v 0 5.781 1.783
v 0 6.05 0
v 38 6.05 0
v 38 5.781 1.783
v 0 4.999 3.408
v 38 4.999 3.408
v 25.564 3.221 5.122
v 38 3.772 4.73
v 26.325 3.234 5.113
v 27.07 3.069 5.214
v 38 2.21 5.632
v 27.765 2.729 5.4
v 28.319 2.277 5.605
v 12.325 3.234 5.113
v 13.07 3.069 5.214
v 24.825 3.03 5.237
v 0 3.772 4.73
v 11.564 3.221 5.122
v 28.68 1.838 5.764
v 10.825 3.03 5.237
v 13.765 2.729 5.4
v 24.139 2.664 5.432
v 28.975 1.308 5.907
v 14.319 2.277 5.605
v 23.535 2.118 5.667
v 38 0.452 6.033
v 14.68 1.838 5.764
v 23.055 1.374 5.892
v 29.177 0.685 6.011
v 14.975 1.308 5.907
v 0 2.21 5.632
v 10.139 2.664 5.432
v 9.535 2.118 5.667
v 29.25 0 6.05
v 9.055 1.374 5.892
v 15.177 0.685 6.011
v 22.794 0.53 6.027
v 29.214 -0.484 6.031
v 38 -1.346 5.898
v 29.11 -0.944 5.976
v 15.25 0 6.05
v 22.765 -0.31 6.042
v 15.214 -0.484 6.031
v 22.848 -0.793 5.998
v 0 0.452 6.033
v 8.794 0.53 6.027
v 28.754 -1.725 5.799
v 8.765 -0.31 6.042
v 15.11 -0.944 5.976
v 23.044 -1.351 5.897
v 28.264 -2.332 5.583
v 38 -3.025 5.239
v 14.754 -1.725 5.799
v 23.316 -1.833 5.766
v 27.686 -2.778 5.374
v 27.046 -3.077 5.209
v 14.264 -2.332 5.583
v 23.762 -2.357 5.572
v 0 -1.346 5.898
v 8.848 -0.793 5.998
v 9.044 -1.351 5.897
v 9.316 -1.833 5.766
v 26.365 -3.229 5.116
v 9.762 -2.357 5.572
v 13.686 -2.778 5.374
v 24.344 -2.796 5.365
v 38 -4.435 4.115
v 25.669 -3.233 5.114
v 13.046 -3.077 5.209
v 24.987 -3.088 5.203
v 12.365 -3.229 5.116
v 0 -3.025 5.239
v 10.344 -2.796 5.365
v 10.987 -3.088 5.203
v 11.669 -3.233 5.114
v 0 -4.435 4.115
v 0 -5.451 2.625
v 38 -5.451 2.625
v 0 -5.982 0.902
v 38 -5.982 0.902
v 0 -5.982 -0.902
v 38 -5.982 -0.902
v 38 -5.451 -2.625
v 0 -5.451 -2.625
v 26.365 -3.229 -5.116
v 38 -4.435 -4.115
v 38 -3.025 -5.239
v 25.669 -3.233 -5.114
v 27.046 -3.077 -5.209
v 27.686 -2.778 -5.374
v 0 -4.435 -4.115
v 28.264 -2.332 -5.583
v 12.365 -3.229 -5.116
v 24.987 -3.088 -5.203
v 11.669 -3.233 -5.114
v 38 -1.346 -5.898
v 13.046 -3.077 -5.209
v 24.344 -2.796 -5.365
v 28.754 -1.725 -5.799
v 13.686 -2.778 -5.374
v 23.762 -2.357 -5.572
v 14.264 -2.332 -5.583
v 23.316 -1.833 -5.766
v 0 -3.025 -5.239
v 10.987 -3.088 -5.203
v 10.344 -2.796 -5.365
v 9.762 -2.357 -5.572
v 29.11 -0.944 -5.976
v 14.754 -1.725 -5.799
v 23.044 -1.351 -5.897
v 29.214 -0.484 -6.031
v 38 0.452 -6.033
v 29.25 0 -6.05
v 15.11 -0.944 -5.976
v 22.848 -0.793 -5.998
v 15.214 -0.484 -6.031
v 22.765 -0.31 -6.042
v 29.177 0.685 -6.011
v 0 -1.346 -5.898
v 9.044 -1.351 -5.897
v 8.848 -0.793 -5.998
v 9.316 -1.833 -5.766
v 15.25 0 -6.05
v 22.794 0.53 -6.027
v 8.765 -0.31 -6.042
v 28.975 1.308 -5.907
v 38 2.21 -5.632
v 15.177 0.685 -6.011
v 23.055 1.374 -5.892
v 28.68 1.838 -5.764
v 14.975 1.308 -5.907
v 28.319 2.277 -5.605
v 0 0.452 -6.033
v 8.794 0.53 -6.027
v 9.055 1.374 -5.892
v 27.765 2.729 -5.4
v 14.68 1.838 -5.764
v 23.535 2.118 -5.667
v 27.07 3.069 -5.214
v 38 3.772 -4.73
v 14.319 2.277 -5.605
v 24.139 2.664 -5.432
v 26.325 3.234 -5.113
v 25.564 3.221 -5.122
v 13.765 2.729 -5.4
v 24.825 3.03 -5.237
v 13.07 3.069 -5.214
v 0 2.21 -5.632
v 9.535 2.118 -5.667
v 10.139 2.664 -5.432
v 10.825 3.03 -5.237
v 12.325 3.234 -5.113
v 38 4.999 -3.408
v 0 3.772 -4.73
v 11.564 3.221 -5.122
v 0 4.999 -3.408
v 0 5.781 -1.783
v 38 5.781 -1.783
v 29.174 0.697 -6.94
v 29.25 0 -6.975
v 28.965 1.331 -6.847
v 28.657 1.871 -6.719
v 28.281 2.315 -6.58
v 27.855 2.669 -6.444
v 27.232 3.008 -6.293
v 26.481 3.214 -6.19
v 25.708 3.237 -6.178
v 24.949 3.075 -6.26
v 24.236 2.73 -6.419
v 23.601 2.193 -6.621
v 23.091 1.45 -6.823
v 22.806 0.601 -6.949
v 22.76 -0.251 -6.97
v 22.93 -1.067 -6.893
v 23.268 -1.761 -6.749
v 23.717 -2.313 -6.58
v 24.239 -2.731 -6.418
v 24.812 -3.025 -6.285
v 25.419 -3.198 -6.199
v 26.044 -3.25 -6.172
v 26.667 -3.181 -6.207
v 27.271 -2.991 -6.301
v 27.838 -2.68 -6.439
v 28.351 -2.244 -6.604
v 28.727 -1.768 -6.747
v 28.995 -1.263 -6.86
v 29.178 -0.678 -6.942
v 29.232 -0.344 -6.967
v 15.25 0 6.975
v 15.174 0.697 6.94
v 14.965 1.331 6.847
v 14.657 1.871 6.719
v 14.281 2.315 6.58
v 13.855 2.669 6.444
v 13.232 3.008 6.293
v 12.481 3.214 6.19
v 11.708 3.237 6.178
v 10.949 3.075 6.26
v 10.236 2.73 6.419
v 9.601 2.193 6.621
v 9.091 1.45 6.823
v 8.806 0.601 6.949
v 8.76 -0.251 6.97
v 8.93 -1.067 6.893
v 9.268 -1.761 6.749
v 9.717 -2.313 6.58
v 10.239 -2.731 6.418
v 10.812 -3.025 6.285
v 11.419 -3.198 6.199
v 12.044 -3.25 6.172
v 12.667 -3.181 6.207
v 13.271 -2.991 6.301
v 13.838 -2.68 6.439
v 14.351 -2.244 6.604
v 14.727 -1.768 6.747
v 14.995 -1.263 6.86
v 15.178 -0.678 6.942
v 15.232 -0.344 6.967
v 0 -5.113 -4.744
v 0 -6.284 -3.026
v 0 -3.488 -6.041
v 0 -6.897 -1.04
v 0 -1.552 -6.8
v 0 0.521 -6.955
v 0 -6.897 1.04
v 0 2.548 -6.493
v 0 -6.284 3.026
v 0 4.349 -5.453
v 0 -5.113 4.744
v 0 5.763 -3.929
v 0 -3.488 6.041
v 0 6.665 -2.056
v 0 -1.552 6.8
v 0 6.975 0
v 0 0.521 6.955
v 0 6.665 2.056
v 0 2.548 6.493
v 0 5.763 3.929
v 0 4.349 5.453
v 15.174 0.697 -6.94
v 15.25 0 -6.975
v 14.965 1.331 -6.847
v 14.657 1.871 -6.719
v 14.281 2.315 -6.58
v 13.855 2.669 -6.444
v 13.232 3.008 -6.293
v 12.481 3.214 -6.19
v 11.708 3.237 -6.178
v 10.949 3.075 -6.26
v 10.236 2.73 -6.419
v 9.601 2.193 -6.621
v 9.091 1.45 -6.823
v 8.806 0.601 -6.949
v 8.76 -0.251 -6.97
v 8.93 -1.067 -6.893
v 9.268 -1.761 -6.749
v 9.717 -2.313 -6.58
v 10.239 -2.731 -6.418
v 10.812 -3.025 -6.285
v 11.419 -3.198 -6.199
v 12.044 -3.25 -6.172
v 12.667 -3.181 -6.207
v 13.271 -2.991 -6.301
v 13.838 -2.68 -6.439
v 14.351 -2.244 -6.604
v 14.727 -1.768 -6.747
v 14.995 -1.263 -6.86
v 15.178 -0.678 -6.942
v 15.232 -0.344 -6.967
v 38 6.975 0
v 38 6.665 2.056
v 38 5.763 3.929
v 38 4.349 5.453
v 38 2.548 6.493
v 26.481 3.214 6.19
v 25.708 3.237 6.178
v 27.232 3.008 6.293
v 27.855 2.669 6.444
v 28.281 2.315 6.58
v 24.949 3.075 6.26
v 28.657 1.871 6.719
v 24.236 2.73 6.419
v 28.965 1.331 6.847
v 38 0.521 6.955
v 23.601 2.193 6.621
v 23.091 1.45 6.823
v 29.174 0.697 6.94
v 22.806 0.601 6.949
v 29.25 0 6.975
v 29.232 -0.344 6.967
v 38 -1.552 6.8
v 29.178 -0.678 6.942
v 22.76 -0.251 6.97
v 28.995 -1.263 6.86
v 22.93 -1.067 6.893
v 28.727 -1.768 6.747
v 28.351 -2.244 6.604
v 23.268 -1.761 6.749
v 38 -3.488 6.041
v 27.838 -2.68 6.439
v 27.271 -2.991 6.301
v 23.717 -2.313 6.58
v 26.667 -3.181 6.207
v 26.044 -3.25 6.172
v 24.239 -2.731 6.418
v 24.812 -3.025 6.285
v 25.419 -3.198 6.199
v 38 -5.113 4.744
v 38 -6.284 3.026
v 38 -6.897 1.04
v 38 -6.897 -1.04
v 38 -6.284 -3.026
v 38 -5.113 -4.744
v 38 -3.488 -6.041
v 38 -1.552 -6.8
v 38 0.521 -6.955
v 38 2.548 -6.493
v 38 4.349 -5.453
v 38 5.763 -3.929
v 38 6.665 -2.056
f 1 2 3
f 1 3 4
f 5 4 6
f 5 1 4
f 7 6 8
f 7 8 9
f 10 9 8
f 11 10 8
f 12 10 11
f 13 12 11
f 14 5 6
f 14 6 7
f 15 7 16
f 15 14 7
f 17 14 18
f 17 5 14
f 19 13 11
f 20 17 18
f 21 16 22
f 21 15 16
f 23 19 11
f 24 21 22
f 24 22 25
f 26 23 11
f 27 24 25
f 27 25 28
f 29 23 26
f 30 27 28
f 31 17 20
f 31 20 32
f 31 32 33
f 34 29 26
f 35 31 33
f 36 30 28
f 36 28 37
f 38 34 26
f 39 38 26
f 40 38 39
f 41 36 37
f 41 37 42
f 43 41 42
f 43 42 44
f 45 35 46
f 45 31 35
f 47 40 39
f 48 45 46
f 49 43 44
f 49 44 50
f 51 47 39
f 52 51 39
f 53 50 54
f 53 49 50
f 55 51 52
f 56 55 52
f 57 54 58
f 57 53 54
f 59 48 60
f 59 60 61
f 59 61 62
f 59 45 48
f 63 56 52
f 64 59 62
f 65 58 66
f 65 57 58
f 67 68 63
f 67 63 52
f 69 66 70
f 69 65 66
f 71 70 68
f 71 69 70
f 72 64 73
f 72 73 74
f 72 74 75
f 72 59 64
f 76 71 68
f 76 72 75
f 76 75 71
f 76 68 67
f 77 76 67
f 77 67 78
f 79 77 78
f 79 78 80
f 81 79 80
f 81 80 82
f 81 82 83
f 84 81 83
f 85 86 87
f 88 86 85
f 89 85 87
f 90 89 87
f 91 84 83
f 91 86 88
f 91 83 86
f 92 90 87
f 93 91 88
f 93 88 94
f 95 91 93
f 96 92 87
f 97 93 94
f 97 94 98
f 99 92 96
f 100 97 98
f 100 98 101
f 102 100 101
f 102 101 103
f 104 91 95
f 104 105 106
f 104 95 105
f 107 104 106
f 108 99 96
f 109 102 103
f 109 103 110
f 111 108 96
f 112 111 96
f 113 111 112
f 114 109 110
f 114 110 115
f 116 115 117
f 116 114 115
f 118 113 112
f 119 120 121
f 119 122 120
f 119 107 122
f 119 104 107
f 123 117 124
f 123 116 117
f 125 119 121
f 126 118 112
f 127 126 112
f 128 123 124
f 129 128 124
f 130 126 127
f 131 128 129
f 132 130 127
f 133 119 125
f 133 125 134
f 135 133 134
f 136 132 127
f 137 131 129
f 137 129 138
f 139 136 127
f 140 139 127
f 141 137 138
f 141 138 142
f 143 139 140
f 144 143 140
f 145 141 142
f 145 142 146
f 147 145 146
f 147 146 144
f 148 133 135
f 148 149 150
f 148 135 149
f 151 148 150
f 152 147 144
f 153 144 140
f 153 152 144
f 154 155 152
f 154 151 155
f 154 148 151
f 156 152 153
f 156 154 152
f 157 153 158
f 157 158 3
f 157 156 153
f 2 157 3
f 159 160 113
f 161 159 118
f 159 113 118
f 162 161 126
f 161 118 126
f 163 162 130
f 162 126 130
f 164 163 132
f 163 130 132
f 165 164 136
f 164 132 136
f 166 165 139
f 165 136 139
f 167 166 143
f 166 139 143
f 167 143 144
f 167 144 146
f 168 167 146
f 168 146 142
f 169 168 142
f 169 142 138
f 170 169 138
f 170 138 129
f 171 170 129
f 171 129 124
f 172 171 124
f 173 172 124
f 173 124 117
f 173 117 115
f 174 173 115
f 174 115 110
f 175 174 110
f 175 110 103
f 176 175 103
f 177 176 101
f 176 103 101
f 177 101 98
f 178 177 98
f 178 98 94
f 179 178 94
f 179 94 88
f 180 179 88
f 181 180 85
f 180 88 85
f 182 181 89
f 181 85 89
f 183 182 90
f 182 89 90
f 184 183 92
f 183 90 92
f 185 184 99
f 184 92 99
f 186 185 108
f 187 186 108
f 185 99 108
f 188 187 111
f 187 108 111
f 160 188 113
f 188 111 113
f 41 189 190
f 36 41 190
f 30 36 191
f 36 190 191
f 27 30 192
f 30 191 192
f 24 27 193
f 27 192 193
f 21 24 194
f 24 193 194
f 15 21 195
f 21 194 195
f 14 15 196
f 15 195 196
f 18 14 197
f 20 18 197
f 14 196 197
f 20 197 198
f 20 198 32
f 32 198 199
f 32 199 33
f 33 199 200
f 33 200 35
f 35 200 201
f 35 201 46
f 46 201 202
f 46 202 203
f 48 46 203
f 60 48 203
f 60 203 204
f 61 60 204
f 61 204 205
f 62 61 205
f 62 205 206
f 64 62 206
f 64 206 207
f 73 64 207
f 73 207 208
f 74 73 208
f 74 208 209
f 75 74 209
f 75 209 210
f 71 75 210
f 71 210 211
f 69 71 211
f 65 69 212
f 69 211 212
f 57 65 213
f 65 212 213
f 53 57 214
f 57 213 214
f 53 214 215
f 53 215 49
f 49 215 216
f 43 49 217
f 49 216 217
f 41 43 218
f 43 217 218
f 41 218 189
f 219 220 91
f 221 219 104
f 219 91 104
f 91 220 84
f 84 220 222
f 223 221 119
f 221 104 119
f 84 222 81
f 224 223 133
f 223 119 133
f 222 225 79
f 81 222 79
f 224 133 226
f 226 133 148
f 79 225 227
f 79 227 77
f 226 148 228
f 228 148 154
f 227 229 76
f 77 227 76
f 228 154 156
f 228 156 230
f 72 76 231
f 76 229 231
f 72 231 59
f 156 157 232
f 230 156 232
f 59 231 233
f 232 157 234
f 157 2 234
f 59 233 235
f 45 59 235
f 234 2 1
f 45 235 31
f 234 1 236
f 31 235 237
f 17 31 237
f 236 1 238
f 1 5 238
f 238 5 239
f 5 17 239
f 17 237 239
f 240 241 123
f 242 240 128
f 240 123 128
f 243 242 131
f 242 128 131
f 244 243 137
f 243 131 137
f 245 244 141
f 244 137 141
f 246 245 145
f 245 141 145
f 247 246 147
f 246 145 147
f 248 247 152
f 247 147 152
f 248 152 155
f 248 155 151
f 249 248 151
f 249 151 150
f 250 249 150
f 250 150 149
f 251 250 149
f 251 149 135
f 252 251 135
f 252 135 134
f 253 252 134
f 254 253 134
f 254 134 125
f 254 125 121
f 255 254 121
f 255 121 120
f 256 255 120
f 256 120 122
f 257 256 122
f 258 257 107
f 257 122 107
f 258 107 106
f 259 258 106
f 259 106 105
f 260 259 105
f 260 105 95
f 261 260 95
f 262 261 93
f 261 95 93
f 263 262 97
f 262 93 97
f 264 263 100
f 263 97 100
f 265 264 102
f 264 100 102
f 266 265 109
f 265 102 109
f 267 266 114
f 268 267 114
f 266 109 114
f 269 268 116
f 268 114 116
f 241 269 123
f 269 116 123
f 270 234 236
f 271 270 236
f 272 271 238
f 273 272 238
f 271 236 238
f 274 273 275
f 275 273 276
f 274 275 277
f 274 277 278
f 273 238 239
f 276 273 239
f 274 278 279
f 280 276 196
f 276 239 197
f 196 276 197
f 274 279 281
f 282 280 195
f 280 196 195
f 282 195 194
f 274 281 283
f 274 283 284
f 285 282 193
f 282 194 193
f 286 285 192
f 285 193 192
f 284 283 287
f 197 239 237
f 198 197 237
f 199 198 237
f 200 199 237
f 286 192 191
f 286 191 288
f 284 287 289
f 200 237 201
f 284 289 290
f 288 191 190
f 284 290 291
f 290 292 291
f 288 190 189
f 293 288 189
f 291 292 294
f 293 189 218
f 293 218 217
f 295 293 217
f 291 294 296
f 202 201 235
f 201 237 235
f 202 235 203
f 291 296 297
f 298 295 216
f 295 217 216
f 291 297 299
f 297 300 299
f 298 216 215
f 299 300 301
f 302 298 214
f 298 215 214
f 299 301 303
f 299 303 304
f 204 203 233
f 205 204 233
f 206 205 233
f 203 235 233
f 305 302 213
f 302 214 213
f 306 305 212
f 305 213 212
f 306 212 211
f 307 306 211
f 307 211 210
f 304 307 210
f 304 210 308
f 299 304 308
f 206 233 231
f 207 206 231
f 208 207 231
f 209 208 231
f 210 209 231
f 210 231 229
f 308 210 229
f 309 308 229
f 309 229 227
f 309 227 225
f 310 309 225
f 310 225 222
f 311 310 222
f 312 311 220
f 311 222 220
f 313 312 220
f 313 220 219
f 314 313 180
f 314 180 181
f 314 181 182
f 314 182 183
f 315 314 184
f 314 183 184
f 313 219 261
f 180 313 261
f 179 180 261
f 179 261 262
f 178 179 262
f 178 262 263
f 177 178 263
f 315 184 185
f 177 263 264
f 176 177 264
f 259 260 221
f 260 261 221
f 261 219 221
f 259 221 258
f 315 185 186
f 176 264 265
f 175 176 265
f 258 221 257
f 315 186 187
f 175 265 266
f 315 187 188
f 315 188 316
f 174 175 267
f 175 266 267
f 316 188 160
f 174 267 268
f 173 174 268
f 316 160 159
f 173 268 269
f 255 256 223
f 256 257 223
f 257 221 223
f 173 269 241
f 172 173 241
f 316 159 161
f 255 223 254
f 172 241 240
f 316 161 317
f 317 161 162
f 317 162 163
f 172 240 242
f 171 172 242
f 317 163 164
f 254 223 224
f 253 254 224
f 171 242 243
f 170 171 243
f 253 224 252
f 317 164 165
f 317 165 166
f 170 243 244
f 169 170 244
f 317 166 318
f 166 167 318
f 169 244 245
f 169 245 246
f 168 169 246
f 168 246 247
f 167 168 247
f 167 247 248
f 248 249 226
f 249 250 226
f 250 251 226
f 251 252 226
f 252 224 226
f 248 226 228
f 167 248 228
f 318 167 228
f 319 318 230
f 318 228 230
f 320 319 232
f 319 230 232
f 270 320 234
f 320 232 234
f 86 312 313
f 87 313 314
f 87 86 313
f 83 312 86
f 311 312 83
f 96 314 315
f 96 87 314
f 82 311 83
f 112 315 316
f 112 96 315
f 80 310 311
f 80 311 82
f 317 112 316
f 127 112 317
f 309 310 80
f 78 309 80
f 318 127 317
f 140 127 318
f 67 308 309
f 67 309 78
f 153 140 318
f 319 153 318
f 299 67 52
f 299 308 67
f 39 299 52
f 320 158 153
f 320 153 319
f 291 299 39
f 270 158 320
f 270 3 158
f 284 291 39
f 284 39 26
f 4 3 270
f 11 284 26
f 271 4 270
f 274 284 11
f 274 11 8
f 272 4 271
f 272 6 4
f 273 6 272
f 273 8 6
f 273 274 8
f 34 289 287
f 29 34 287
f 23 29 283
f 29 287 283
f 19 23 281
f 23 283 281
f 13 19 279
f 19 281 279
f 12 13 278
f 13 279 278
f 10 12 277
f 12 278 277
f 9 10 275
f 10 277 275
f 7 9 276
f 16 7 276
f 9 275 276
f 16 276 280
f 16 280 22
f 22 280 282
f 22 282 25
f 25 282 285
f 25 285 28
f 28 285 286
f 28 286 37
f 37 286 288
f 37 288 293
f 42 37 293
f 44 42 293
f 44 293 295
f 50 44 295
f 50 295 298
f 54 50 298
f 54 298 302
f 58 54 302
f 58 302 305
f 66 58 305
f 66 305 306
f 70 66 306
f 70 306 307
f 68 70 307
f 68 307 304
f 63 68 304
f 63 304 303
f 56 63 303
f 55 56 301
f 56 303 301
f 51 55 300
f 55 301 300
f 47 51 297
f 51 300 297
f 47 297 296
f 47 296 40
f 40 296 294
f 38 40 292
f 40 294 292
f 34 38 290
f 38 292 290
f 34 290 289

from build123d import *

# Parameters (mm, degrees)
F0_R     = 6.975
F0_R_2   = 6.05
F1_DEPTH = 38
F3_R     = 3.25
F4_DEPTH = 14


with BuildPart() as f1:
    # F0 (on Right) → F1 (new body)
    with BuildSketch(Plane.YZ):
        Circle(F0_R)
        Circle(F0_R_2, mode=Mode.SUBTRACT)
    extrude(amount=F1_DEPTH)

    # F3 (on offset) → F4 (cut)
    with BuildSketch(Plane.XY.offset(7)):
        with Locations((12, 0)):
            Circle(F3_R)
        with Locations((26, 0)):
            Circle(F3_R)
    extrude(amount=-F4_DEPTH, mode=Mode.SUBTRACT)


solid = f1.part
